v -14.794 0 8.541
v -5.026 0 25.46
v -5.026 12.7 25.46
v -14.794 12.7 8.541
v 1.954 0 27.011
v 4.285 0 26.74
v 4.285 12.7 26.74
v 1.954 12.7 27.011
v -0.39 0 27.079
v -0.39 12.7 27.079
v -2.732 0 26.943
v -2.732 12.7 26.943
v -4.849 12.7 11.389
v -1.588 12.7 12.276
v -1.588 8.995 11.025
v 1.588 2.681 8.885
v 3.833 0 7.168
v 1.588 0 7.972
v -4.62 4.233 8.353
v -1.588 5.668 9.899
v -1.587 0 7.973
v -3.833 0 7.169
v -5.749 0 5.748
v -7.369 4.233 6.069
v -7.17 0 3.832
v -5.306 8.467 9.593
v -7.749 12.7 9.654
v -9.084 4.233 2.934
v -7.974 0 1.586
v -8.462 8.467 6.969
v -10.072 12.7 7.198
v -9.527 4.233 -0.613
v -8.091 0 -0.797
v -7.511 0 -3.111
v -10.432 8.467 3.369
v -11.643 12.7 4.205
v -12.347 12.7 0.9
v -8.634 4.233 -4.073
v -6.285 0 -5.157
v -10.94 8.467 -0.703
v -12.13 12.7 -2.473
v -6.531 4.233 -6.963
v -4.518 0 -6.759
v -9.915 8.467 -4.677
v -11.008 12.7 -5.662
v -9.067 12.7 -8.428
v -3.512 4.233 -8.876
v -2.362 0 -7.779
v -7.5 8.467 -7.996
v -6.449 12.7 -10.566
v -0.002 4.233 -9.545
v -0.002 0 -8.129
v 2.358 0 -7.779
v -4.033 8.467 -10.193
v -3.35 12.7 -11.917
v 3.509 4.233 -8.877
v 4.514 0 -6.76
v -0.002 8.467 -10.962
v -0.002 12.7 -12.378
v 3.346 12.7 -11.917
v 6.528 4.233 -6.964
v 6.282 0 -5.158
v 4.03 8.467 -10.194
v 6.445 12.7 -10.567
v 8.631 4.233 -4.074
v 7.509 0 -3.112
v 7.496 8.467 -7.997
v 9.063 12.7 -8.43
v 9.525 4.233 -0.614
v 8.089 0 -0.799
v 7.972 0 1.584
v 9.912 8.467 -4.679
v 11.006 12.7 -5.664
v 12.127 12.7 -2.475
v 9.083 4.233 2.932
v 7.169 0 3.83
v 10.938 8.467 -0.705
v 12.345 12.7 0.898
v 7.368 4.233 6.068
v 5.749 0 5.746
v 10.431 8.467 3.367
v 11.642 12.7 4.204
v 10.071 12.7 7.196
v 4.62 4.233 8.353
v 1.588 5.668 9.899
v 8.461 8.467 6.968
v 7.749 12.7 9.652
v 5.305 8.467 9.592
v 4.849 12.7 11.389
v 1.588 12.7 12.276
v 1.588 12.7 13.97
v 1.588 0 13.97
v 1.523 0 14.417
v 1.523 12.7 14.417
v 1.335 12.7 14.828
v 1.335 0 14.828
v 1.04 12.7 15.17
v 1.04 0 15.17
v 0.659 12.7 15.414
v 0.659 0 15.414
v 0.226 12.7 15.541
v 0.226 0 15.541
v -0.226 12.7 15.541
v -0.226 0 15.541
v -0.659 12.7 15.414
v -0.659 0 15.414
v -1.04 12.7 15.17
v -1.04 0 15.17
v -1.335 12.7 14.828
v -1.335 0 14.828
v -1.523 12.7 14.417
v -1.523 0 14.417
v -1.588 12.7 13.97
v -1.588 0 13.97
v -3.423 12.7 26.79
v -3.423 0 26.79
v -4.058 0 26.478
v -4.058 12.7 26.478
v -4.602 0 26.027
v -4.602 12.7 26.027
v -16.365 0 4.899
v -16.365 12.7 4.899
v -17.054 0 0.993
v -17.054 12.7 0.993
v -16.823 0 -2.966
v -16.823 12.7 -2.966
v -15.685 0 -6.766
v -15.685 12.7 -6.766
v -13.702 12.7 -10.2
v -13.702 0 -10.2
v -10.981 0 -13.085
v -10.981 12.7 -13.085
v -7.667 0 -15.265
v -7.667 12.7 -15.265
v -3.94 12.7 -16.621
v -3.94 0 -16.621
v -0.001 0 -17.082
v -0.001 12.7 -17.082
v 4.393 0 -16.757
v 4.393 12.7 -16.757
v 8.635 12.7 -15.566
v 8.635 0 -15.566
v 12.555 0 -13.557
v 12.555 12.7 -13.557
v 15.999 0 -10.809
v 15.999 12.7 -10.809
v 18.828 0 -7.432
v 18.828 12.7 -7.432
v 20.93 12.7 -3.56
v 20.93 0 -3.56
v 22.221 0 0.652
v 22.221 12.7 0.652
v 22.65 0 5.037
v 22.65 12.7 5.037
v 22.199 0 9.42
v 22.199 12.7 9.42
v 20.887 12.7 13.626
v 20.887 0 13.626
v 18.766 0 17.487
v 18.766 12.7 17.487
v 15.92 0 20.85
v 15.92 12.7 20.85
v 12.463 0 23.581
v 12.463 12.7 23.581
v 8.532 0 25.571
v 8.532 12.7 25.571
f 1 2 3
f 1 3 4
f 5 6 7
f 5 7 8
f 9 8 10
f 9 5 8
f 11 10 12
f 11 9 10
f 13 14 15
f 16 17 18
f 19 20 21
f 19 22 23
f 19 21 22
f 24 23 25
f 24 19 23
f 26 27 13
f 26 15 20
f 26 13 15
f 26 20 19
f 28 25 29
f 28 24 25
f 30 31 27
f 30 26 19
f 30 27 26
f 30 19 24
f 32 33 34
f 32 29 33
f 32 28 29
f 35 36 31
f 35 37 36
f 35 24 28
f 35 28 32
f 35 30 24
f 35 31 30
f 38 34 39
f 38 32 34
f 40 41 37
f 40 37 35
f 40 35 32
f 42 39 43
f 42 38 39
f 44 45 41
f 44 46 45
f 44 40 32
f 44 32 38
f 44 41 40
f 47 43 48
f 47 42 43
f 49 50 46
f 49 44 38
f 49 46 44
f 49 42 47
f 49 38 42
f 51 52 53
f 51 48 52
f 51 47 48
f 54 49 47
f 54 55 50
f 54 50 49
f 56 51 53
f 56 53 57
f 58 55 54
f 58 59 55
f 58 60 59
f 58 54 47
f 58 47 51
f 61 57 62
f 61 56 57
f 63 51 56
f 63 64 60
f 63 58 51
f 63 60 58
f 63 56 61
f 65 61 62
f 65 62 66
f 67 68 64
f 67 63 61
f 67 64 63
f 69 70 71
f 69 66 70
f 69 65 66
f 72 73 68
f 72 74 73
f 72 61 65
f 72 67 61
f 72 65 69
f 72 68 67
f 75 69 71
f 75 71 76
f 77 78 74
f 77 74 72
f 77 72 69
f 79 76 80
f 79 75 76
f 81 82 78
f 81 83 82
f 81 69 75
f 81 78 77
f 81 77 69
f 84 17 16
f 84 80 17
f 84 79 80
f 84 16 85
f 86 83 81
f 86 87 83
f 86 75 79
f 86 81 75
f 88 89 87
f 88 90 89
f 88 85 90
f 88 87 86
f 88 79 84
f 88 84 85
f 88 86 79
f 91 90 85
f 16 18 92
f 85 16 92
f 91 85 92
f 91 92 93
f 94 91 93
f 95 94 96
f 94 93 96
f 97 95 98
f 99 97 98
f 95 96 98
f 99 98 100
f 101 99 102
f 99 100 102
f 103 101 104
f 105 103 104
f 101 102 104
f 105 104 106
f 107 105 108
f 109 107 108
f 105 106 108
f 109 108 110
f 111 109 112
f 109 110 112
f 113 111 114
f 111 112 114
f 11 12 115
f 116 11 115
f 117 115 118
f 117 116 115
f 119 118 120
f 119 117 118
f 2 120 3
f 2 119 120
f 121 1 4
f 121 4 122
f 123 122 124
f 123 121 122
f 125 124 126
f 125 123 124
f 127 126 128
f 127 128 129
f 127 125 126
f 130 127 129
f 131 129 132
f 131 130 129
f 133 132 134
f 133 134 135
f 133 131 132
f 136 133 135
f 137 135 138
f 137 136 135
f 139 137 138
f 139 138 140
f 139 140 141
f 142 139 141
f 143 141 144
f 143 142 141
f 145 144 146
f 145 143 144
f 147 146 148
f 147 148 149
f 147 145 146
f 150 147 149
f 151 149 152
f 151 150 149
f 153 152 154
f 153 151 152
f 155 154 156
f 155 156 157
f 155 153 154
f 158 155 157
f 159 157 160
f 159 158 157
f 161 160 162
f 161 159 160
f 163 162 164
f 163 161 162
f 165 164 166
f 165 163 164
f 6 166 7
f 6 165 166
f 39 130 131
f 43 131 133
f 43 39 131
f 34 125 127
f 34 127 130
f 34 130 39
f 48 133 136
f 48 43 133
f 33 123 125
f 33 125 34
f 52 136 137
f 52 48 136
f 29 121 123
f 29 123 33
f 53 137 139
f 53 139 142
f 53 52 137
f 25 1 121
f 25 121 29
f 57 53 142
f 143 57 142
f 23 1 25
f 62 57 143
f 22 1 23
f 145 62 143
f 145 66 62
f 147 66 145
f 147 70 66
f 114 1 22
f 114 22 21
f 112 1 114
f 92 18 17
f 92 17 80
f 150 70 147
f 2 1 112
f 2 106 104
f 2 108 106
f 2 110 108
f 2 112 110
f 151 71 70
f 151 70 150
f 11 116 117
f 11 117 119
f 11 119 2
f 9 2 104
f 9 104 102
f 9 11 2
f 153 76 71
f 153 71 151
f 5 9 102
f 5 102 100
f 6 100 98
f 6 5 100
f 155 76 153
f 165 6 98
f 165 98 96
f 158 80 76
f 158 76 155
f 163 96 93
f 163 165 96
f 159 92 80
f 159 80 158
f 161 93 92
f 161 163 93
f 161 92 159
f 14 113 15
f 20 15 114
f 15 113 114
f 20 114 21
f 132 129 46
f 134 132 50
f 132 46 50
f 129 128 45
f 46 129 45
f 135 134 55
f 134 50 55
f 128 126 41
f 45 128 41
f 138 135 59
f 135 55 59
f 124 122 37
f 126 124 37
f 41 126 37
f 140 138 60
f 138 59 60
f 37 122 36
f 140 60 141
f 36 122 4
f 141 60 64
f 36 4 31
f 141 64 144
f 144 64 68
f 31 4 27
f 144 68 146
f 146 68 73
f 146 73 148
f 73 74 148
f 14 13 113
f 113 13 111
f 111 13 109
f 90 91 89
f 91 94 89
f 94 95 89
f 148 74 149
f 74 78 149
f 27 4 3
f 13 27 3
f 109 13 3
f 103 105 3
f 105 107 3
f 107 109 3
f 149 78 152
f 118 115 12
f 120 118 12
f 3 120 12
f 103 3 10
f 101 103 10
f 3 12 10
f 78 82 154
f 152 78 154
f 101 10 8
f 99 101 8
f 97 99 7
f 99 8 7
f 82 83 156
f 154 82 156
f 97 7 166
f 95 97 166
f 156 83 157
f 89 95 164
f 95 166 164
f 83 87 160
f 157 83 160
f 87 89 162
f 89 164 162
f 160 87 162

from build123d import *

# Parameters (mm, degrees)
F0_R     = 8.128
F1_DEPTH = 12.7
F5_DEPTH = 12.701


# Not quite as in the source:
# - ends of sketch curves that miss each other by under 0.0002 mm in the source are joined


with BuildPart() as f1:
    # F0 (on Front) → F1 (new body)
    with BuildSketch(Plane.XZ):
        with BuildLine():
            Line((-5.0256186, 25.460071), (-14.7940014, 8.54075))
            ThreePointArc((-14.7940014, 8.54075), (-14.7940038016, -8.5407495378), (-0.0009906, -17.0815))
            ThreePointArc((-0.0009906, -17.0815), (22.5453798959, 2.8340109101), (4.2845187845, 26.7402328229))
            ThreePointArc((4.2845187845, 26.7402328229), (0.7827449758, 27.0701370063), (-2.7322519698, 26.9433993832))
            ThreePointArc((-2.7322519698, 26.9433993832), (-4.0577155326, 26.4781440431), (-5.0256186, 25.460071))
        make_face()
        with Locations((-0.0009906, 0)):
            Circle(F0_R, mode=Mode.SUBTRACT)
    extrude(amount=-F1_DEPTH)

    # F2 (on Top) → F3 (revolve, cut)
    with BuildSketch(Plane.XY):
        Polygon((1.778, 0), (8.128, 0), (12.4623477688, 12.954), (8.128, 12.954), (1.778, 12.954), align=None)
    revolve(axis=Axis((-0.0009906, 0, 0), (0, -1, 0)), mode=Mode.SUBTRACT)

    # F4 (on face) → F5 (cut, through all)
    with BuildSketch(Plane.XZ):
        with BuildLine():
            Line((-1.5875, 13.97), (-1.5875, 3.0828800518))
            Line((-1.5875, 3.0828800518), (1.5875, 3.0828800518))
            Line((1.5875, 3.0828800518), (1.5875, 13.97))
            ThreePointArc((1.5875, 13.97), (0, 15.5575), (-1.5875, 13.97))
        make_face()
    extrude(amount=-F5_DEPTH, mode=Mode.SUBTRACT)


solid = f1.part
